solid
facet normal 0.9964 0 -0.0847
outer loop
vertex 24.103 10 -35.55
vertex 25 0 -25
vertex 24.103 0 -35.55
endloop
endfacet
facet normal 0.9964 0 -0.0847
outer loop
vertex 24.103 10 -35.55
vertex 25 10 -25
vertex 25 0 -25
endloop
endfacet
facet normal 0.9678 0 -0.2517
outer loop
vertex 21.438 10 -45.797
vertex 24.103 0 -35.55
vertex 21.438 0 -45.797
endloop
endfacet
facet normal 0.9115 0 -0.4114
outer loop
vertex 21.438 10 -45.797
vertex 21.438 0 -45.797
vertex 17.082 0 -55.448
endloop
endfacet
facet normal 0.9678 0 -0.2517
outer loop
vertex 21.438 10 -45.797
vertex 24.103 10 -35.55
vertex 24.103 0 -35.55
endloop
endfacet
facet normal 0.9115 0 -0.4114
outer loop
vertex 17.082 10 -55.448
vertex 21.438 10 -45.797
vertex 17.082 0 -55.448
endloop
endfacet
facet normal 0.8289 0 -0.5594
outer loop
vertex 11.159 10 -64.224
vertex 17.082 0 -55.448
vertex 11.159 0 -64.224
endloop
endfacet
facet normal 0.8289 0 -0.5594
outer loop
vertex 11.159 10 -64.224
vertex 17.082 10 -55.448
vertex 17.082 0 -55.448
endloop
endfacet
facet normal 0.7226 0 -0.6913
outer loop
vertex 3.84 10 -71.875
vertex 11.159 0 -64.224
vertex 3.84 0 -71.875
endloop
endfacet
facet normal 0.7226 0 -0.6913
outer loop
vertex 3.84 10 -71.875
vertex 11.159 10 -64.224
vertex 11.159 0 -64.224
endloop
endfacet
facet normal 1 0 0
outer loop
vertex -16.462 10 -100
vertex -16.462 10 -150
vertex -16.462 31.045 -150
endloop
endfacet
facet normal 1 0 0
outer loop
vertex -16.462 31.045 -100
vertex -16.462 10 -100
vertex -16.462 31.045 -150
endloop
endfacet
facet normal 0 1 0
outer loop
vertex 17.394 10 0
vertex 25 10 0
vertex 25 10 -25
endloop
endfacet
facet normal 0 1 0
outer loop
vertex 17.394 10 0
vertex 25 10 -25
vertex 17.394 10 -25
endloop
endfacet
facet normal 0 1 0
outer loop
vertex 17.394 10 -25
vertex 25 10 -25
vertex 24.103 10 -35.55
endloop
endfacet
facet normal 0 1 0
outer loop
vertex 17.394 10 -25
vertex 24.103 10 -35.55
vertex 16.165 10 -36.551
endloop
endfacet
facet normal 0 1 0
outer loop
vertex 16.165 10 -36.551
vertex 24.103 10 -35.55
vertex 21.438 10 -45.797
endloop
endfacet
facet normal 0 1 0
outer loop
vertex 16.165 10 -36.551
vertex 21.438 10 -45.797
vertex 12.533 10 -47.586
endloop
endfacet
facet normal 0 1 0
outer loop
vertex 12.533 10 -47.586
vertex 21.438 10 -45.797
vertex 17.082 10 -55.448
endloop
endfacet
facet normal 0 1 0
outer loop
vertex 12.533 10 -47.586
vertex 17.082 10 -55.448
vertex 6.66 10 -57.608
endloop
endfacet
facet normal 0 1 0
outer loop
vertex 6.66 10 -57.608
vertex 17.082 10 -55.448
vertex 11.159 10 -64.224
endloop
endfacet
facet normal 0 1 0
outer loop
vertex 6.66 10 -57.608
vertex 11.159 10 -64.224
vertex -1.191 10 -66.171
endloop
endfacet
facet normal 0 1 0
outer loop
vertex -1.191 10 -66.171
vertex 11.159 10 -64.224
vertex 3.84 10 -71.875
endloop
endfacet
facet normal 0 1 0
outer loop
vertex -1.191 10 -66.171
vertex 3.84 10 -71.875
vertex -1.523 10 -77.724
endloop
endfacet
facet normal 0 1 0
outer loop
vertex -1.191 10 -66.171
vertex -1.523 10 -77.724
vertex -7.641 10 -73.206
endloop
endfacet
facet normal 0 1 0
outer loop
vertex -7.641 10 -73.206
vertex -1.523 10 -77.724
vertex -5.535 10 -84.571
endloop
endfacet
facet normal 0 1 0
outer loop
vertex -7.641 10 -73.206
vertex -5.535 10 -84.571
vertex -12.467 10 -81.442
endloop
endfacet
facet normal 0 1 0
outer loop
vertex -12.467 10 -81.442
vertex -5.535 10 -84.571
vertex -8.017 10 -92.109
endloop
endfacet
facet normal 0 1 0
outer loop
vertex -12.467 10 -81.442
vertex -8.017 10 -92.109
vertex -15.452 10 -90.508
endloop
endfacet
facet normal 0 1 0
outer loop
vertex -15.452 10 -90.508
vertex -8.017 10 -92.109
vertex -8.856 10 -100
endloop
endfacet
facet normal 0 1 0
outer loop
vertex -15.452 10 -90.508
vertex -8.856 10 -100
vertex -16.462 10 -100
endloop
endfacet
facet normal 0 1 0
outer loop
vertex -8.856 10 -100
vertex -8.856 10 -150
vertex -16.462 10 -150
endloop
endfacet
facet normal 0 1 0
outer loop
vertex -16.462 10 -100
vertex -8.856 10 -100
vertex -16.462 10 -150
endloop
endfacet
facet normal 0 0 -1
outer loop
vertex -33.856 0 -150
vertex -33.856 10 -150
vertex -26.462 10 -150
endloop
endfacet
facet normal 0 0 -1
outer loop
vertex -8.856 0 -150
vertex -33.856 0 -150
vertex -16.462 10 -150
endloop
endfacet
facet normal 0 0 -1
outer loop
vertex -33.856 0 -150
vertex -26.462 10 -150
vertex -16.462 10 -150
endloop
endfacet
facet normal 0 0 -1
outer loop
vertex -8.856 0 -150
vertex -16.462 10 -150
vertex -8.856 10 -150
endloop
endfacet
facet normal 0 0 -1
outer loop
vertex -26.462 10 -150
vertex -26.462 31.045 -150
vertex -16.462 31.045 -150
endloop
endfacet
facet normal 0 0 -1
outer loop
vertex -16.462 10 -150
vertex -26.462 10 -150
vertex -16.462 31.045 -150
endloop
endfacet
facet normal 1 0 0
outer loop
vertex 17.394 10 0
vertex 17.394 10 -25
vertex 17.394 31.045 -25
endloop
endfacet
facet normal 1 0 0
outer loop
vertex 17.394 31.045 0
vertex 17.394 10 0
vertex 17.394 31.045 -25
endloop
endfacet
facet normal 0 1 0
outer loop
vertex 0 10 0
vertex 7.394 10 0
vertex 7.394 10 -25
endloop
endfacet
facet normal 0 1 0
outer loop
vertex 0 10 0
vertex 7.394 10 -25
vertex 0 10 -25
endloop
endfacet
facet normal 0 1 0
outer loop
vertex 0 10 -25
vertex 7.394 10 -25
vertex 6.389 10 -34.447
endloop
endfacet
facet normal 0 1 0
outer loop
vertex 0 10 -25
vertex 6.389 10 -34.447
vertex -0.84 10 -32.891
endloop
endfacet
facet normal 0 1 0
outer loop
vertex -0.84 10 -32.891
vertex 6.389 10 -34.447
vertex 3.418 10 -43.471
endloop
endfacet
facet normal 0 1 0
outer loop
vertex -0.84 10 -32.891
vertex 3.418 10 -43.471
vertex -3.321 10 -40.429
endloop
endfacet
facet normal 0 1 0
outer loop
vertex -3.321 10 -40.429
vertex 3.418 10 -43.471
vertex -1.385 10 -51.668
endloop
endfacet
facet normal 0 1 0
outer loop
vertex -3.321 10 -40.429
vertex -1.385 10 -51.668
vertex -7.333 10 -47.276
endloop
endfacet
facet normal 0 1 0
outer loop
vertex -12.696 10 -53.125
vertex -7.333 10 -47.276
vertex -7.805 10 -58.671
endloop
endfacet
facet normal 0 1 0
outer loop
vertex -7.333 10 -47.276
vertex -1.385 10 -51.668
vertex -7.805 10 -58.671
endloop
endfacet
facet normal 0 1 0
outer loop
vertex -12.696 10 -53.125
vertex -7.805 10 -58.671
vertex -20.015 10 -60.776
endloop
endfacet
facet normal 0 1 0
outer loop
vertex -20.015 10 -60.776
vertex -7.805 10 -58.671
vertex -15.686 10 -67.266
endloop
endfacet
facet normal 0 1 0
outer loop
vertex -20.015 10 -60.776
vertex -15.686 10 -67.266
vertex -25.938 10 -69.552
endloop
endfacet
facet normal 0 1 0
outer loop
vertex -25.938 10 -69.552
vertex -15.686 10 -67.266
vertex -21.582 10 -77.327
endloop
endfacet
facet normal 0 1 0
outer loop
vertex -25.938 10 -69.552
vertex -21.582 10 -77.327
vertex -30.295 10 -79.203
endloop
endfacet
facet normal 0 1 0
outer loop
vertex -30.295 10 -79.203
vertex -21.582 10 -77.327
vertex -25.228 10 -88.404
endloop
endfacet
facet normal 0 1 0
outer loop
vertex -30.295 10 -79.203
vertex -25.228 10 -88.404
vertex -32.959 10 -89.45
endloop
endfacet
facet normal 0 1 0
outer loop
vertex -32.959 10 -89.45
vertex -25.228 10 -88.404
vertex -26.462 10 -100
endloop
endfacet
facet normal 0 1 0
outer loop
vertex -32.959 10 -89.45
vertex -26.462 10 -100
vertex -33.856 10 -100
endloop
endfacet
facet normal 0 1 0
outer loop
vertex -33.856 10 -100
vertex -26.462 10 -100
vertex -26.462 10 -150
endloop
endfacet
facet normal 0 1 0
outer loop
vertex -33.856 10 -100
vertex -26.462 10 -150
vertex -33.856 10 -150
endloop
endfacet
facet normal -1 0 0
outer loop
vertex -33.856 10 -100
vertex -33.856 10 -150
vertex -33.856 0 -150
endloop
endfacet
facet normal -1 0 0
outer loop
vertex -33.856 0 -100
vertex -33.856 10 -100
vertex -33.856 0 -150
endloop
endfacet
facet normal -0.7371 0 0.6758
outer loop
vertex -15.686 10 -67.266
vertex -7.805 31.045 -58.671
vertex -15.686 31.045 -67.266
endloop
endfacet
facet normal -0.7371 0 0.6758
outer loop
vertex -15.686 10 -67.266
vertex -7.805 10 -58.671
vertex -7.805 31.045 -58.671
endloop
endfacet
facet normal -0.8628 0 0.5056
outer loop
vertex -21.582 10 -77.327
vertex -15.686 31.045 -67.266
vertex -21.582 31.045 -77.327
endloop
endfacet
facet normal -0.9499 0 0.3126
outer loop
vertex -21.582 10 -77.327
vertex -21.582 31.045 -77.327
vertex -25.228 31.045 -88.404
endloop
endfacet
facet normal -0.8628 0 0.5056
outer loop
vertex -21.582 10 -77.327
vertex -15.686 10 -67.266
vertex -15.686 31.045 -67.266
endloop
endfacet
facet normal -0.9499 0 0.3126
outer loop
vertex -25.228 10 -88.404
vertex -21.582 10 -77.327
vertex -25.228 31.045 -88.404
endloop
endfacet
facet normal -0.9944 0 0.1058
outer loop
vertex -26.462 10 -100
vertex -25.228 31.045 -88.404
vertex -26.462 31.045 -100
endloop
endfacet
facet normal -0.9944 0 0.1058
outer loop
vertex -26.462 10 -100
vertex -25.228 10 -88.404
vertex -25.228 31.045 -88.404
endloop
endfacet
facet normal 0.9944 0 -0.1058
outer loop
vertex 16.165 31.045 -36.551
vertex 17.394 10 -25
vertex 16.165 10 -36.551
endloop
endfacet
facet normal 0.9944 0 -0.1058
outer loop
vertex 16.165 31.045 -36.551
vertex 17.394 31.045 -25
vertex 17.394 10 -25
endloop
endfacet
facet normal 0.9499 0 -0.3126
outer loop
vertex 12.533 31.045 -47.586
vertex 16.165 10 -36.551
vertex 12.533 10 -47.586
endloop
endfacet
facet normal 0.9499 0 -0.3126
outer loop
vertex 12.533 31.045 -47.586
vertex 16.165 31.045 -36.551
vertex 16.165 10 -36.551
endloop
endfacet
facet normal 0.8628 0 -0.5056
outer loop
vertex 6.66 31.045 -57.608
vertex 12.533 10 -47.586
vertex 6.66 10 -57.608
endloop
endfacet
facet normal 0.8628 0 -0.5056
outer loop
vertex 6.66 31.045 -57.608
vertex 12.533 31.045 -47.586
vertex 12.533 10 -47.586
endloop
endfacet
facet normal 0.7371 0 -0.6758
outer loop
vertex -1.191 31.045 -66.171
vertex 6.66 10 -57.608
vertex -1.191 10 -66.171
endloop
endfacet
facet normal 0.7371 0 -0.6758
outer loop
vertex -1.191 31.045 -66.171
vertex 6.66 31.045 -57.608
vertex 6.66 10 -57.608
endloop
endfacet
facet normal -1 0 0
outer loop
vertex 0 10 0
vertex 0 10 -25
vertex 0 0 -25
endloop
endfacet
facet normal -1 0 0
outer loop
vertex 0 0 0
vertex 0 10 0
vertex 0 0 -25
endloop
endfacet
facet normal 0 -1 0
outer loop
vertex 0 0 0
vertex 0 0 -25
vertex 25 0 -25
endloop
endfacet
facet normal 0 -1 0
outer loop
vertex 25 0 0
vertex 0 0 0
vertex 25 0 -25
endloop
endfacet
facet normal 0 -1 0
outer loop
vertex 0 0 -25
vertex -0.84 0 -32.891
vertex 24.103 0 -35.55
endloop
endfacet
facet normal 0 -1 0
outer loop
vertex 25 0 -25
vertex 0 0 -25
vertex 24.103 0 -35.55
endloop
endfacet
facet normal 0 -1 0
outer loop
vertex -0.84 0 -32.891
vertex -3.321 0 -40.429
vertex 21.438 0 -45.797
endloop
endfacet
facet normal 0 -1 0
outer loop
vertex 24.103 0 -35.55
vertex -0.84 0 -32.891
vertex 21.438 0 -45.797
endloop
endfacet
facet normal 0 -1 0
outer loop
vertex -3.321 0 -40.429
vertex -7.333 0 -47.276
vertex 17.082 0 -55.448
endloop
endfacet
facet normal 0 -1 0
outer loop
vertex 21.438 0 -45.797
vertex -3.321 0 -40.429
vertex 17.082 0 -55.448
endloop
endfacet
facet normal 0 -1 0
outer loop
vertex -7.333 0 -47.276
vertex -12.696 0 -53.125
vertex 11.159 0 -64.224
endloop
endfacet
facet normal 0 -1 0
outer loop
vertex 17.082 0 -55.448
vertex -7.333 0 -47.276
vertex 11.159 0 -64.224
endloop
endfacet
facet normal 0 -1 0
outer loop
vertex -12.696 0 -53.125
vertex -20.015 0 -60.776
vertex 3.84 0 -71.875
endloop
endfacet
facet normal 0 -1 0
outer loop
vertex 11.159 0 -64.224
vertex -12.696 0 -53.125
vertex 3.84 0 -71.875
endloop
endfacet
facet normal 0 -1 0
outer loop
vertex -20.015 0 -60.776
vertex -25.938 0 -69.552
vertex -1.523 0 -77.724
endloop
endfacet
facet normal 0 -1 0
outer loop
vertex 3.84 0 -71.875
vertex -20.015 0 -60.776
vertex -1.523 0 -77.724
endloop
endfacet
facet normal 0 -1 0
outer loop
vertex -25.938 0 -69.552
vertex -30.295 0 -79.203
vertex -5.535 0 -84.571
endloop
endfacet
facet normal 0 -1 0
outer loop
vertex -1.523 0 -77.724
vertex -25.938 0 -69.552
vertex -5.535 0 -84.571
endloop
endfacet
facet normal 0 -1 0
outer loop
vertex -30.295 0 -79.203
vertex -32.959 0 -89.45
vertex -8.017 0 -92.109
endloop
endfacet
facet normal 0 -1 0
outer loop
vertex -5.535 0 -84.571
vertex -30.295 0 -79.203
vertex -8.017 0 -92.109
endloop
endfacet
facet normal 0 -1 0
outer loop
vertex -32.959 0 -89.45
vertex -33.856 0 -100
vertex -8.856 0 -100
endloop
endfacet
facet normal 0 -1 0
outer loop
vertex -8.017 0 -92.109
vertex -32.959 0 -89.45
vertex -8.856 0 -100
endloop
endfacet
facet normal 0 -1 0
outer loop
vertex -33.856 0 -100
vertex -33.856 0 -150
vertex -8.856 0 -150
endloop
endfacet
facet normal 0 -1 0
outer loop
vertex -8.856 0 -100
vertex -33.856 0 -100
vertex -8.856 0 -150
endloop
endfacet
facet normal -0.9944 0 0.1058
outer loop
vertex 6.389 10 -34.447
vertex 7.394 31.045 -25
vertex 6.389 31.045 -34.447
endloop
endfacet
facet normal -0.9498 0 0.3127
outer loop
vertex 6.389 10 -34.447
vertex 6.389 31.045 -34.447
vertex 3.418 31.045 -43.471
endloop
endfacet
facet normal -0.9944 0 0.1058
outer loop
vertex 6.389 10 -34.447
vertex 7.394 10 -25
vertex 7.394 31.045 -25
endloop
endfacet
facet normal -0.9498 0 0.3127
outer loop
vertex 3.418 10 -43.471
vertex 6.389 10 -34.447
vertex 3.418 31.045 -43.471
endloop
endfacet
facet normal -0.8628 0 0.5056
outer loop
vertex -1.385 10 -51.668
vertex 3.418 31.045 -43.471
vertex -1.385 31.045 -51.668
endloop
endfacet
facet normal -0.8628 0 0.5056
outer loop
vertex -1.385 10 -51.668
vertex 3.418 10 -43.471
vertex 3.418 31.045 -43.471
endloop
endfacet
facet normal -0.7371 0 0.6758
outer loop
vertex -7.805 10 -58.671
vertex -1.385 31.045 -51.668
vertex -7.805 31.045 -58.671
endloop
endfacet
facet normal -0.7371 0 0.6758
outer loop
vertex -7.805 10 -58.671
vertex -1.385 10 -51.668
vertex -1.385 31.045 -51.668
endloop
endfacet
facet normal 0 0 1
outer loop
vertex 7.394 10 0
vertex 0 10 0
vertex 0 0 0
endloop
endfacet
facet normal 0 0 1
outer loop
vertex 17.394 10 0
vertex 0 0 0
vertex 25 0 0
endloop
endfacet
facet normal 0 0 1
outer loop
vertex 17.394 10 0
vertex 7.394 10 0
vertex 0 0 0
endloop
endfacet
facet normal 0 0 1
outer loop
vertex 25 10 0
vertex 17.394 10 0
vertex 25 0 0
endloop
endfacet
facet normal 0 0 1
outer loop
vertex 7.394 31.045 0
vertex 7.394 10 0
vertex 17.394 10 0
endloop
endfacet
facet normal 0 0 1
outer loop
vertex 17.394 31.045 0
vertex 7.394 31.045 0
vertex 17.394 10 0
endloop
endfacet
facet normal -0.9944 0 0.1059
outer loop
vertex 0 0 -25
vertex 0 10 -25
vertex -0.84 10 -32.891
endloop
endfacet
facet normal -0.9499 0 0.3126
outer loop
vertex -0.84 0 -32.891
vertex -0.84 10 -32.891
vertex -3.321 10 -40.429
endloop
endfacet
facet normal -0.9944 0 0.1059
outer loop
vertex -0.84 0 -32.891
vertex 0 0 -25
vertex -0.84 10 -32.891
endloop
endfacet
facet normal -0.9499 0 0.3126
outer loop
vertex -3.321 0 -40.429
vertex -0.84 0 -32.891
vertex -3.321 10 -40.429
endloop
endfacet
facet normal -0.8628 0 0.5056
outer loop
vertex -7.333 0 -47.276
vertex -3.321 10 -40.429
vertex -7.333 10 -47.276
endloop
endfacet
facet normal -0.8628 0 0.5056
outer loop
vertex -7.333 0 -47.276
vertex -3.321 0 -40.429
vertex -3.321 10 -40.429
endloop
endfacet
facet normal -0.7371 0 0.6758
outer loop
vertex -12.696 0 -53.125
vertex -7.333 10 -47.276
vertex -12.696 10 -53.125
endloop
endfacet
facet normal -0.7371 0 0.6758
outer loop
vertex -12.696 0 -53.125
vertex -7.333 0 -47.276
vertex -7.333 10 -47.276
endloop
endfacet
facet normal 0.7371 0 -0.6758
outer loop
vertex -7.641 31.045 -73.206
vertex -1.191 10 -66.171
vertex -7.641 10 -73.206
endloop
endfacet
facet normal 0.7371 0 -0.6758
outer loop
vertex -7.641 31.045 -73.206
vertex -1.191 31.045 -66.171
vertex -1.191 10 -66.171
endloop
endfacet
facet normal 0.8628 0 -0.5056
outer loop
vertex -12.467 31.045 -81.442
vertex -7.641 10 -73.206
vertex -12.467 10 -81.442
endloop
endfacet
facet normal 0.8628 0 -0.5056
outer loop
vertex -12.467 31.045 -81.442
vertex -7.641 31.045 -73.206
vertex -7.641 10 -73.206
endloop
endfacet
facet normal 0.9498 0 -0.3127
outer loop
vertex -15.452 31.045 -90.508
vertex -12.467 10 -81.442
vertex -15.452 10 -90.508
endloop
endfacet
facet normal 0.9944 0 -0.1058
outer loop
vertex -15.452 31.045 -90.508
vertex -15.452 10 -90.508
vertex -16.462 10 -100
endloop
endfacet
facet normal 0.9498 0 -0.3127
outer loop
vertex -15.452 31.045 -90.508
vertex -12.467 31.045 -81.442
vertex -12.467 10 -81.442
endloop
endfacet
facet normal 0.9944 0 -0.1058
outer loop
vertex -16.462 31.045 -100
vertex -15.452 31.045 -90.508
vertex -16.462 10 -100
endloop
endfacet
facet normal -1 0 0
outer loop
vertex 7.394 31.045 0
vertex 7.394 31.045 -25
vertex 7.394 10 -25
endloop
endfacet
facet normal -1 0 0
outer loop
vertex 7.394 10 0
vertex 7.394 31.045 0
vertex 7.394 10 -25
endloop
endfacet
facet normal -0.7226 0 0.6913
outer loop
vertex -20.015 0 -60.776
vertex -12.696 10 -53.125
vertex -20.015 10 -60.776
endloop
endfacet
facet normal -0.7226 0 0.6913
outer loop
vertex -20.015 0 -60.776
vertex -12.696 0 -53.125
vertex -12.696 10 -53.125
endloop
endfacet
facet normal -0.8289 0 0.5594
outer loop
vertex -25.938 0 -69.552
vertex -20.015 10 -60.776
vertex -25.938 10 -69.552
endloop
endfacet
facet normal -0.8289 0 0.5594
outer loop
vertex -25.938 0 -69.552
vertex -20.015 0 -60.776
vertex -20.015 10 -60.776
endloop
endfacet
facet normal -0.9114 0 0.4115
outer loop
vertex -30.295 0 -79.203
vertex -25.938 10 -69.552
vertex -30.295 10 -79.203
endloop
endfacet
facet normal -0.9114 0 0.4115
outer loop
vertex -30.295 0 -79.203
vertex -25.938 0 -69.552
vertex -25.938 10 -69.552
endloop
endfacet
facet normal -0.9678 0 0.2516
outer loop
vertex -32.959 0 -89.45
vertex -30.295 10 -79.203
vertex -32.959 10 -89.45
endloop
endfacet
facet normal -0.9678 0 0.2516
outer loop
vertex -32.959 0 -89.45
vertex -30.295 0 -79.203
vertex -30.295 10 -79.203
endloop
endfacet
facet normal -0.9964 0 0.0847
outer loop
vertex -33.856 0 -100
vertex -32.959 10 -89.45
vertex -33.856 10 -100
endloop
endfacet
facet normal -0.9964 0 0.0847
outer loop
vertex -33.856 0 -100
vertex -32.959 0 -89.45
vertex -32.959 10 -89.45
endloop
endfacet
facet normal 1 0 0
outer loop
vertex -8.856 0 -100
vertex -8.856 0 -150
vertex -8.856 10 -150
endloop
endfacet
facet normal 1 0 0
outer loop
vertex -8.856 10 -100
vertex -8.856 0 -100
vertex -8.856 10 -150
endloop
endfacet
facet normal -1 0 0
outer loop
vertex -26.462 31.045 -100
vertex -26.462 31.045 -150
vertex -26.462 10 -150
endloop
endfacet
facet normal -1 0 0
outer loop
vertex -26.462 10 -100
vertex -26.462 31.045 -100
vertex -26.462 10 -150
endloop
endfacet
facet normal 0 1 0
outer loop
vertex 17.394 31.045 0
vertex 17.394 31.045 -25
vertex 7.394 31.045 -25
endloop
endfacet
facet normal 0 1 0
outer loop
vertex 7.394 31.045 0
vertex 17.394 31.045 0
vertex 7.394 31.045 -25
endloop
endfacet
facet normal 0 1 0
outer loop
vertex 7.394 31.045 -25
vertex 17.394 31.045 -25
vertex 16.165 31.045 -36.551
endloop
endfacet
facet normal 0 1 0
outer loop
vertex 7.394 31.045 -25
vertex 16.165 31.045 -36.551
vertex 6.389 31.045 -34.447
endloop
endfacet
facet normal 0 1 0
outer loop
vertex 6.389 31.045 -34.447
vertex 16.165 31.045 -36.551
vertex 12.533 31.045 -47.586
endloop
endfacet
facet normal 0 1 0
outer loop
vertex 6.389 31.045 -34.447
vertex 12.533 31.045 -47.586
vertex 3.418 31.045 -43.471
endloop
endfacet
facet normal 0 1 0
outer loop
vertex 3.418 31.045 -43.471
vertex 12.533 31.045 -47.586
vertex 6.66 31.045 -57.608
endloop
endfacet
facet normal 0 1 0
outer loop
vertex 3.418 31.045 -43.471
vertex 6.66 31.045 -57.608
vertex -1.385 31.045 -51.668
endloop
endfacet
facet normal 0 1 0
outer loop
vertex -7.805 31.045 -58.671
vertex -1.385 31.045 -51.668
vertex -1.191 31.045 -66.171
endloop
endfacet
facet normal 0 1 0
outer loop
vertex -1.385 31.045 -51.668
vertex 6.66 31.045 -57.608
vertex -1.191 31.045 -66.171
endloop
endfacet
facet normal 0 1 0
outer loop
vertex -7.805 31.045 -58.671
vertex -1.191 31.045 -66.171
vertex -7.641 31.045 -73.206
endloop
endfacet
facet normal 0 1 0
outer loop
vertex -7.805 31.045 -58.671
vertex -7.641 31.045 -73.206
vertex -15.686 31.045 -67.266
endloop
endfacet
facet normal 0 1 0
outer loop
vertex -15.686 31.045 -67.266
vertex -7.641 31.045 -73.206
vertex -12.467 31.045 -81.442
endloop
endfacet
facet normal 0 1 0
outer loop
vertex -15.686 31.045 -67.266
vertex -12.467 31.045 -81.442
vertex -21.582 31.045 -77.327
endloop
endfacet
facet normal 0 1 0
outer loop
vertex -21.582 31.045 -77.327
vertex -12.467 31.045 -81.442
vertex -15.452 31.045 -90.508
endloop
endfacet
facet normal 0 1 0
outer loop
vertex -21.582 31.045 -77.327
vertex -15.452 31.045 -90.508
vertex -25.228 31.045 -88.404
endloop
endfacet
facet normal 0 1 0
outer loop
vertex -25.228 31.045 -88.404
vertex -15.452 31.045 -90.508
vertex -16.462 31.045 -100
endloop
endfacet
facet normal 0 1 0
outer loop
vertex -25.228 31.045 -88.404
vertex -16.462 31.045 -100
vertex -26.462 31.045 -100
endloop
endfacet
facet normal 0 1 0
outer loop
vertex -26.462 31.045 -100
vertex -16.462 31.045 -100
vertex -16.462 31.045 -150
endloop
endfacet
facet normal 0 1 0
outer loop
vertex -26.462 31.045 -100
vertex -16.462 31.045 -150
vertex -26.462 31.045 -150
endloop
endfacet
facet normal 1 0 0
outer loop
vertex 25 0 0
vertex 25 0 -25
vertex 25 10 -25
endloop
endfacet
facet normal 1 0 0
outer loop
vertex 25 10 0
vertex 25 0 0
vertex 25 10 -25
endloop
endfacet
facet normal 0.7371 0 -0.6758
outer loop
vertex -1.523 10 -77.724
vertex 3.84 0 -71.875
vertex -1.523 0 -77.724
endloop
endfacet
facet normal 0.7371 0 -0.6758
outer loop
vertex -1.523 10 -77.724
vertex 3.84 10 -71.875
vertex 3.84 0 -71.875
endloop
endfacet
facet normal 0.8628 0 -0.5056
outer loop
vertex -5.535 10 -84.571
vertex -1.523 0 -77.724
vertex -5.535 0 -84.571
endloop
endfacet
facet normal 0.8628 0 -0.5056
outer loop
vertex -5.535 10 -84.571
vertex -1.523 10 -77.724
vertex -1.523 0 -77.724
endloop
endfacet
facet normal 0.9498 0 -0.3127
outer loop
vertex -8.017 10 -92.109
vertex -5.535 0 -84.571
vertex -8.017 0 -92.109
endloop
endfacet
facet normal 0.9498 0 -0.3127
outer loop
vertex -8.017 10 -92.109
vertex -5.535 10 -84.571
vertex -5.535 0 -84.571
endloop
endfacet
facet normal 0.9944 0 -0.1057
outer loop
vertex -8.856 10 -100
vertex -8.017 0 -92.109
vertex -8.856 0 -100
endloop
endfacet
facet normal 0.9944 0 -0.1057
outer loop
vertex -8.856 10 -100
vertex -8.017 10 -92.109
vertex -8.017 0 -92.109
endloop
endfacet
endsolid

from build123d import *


with BuildPart() as part:
    # Sweep1: sweep along a path in Sketch3
    with BuildLine(Plane(origin=(0, 0, 0), x_dir=(1, 0, 0), z_dir=(0, 1, 0))) as sweep1_path:
        Line((12.5, 0), (12.5, 25))
        ThreePointArc((12.5, 25), (8.071891388, 45.571891388), (-4.428108612, 62.5))
        ThreePointArc((-4.428108612, 62.5), (-16.928108612, 79.428108612), (-21.356217223, 100))
        Line((-21.356217223, 100), (-21.356217223, 150))
    # Sketch1 → Sweep1 (sweep)
    with BuildSketch(Plane.XY):
        Polygon((17.394366197, 10), (25, 10), (25, 0), (0, 0), (0, 10), (7.394366197, 10), (7.394366197, 31.044600939), (17.394366197, 31.044600939), align=None)
    sweep(path=sweep1_path.line)


solid = part.part
